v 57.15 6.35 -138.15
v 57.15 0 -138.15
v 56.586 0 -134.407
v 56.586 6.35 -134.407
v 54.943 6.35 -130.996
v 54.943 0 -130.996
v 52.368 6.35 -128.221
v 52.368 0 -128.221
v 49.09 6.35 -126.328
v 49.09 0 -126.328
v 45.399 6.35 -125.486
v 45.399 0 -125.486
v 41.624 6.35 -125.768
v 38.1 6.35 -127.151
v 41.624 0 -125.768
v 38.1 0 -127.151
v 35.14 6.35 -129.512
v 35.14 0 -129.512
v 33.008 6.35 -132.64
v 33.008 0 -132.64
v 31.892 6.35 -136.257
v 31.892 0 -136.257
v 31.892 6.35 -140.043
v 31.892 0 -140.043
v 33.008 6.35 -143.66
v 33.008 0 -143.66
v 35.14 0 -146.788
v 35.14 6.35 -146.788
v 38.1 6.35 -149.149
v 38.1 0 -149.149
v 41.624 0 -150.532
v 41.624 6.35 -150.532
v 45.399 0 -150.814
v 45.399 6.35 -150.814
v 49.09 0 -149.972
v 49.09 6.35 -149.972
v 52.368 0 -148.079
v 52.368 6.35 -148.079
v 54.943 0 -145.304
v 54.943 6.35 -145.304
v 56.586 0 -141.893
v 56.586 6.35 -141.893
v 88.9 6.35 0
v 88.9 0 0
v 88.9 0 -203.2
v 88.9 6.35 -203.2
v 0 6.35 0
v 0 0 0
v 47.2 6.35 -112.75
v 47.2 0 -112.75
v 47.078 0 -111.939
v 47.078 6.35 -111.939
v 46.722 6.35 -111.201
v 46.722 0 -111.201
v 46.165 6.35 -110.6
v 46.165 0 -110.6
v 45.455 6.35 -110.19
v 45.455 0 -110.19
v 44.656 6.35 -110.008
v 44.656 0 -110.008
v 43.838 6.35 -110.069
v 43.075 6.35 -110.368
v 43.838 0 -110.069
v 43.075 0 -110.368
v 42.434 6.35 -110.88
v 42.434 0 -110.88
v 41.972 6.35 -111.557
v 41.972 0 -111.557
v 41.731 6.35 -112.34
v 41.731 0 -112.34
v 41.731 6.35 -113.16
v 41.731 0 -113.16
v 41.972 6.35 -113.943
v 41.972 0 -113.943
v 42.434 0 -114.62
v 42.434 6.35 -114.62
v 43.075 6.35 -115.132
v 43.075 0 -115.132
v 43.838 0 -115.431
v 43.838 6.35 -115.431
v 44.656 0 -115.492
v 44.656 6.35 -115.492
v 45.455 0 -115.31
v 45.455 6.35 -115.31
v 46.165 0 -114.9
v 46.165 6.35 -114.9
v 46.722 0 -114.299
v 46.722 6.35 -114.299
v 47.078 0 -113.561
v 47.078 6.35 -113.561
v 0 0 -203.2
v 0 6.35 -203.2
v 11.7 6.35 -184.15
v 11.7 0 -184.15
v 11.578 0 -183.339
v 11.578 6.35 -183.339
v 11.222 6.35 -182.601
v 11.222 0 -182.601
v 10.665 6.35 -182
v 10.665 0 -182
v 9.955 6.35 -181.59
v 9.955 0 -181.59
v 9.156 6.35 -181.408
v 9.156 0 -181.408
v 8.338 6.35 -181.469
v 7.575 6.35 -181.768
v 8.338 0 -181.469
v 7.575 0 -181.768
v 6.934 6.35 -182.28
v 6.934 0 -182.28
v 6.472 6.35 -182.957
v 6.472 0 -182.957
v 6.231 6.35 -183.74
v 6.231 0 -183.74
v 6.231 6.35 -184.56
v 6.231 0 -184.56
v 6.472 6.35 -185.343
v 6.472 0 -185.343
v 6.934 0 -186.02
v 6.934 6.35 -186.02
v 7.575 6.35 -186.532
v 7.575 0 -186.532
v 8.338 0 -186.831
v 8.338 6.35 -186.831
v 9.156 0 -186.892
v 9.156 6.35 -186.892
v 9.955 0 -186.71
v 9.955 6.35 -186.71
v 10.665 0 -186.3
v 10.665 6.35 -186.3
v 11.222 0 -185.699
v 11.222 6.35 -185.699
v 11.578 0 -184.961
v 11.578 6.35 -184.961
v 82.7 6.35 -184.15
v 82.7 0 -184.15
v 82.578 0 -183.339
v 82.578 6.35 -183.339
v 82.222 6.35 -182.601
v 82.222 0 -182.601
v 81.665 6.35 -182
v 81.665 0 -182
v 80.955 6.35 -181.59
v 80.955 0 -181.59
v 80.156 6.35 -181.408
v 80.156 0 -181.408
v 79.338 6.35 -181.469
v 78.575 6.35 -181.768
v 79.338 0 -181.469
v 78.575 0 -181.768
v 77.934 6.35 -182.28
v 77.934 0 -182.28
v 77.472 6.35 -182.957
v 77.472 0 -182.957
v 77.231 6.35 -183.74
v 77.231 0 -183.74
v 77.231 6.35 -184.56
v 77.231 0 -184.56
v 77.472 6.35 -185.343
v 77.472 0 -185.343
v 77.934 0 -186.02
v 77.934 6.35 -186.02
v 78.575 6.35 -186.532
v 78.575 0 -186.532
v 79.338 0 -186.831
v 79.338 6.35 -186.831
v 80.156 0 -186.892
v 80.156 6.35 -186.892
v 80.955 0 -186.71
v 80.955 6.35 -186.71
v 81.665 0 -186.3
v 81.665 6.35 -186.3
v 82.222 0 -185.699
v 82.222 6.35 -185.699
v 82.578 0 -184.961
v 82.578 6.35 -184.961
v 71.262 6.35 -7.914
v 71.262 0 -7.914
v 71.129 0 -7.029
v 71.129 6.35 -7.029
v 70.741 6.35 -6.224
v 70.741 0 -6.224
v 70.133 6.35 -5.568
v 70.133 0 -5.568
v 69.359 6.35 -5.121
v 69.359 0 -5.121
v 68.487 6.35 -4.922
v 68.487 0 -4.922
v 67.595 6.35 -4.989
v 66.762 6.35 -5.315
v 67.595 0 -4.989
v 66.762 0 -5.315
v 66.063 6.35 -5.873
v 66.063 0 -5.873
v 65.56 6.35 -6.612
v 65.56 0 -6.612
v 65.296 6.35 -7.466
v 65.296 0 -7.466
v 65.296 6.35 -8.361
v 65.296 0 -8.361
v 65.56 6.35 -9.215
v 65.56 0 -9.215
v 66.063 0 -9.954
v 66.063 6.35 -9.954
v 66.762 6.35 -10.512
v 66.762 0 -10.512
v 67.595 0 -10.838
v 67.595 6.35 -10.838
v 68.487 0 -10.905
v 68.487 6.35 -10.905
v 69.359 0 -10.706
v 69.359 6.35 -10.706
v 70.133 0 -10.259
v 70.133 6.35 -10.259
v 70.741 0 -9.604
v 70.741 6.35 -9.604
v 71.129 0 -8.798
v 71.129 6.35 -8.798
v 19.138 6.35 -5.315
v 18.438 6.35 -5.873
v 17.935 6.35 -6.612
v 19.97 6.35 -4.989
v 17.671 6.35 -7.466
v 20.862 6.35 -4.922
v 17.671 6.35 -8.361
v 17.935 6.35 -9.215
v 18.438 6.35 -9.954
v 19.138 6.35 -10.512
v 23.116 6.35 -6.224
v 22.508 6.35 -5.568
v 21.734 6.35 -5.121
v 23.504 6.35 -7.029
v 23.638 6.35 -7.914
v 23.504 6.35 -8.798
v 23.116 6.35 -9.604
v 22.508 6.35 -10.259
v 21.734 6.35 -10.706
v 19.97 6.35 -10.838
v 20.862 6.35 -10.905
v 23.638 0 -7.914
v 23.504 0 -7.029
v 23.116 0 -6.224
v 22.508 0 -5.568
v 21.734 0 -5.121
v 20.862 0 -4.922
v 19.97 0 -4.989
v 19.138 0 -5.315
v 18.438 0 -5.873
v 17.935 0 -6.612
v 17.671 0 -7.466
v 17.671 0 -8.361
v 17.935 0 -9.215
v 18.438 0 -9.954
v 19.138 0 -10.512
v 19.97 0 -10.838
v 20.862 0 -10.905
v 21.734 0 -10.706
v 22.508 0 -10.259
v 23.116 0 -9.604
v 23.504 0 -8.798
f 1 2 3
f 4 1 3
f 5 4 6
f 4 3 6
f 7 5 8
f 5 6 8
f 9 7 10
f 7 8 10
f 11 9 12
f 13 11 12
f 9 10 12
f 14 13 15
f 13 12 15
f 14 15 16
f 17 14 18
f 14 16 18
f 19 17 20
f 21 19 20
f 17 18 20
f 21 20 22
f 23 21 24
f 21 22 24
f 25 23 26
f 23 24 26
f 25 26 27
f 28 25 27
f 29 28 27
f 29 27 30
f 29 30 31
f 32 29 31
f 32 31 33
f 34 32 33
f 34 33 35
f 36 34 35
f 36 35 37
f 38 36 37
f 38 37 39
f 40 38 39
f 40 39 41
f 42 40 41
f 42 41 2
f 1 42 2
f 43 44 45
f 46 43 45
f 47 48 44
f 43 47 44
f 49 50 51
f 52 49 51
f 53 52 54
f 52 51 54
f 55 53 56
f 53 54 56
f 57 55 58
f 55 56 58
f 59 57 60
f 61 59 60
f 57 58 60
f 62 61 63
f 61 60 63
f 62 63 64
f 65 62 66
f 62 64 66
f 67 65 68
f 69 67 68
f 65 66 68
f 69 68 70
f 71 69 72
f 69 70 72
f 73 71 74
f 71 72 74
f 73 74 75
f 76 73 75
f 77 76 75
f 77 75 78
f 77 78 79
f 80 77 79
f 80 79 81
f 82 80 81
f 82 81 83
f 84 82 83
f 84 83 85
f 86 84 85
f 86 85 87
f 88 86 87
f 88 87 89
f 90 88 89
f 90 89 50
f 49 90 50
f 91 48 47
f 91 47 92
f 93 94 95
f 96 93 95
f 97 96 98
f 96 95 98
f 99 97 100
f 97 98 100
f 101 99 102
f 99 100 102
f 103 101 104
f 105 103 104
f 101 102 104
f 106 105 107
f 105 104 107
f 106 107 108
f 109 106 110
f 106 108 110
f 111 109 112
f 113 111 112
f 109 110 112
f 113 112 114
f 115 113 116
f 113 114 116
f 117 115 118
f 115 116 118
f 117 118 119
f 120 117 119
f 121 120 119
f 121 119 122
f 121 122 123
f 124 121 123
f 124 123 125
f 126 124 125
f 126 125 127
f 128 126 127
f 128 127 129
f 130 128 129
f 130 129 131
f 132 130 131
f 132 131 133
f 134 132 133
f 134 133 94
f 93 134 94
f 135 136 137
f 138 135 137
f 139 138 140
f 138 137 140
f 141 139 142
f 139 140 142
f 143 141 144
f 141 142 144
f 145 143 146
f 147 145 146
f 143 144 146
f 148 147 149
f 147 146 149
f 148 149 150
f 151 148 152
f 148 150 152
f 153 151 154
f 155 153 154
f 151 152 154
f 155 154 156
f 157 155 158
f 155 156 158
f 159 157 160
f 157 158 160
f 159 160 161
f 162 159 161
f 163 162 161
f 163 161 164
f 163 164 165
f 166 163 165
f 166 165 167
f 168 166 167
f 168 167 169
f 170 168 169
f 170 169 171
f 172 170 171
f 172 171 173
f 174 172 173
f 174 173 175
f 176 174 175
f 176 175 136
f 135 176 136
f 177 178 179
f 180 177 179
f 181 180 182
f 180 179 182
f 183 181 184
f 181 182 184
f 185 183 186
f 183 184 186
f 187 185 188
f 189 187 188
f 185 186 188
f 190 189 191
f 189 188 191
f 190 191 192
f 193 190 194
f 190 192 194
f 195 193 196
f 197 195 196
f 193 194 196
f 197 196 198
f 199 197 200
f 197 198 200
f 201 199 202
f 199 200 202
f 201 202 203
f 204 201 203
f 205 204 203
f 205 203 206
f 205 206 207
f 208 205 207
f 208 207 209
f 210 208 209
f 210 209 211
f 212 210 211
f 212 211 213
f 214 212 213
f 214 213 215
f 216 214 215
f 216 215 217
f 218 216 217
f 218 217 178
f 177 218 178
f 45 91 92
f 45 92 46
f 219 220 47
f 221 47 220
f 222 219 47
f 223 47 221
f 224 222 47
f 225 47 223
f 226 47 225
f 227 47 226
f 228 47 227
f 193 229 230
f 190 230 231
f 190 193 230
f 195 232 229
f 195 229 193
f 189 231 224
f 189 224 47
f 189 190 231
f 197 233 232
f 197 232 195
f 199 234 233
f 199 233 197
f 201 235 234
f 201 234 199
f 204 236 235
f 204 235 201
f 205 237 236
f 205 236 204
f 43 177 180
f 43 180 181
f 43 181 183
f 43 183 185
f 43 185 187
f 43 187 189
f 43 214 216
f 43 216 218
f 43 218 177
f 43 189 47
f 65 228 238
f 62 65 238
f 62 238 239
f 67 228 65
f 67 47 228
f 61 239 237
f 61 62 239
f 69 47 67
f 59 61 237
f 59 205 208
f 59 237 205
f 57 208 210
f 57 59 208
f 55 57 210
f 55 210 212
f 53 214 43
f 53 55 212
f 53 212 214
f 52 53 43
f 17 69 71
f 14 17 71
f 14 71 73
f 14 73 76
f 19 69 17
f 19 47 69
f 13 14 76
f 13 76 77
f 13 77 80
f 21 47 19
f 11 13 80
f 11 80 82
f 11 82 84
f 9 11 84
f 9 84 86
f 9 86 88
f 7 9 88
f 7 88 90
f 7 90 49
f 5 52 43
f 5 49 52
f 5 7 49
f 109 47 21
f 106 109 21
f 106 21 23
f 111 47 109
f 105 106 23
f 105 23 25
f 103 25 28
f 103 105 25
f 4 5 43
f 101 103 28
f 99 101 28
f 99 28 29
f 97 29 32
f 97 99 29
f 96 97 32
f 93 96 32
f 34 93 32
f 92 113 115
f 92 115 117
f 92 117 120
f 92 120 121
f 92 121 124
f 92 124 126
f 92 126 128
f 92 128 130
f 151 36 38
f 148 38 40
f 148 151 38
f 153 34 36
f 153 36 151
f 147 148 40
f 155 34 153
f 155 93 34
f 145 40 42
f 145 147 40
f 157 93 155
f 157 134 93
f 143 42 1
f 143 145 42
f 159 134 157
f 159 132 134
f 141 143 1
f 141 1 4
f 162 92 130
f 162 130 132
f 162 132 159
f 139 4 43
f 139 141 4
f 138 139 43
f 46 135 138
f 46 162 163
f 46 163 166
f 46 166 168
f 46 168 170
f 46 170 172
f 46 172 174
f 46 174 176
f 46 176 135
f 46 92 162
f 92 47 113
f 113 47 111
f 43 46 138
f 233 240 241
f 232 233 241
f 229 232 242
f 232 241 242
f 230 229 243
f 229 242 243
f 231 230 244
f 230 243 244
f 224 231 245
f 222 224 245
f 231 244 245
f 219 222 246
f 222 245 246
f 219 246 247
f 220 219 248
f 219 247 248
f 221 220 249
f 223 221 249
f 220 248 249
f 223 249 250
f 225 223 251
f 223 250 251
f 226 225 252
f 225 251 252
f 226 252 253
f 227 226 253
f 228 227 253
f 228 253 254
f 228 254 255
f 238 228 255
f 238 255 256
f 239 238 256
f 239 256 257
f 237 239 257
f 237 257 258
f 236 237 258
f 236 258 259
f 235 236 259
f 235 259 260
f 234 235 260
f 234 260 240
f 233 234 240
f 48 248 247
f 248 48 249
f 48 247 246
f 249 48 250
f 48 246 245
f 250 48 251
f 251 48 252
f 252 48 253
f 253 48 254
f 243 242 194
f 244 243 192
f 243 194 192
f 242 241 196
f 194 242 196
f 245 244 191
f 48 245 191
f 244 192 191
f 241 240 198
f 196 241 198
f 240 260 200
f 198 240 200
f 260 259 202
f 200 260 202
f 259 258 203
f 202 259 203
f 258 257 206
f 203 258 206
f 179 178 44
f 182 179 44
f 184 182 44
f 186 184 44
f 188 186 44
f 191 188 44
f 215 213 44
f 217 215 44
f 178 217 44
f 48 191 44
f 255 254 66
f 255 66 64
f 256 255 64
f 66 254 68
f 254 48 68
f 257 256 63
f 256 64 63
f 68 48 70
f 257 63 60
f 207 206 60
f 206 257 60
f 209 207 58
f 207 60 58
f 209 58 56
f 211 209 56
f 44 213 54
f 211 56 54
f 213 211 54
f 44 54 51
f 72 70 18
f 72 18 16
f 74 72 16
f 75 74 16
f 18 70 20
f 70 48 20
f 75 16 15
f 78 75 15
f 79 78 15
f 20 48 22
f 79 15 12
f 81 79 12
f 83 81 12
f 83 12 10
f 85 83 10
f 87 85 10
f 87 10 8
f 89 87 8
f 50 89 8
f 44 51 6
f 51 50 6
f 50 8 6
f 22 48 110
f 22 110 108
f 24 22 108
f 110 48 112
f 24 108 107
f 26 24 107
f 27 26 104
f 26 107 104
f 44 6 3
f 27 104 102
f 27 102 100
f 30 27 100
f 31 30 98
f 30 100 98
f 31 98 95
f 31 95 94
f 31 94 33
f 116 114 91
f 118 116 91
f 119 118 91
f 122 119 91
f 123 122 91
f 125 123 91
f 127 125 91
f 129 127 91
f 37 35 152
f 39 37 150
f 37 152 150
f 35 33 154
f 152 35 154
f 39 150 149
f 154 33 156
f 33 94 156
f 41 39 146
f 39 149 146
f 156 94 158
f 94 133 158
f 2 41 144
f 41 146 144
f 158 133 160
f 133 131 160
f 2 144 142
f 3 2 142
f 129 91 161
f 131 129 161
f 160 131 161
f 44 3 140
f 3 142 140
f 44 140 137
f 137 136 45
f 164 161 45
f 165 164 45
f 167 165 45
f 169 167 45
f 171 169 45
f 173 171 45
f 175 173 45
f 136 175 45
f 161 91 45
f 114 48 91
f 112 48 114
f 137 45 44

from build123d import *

# Parameters (mm, degrees)
SKETCH1_W           = 88.9
SKETCH1_H           = 203.2
BOSS_EXTRUDE1_DEPTH = 6.35
SKETCH2_R           = 3
SKETCH2_R_2         = 2.75
SKETCH2_R_3         = 12.7
CUT_EXTRUDE1_DEPTH  = 7.35


with BuildPart() as part:
    # Sketch1 → Boss-Extrude1 (new body)
    with BuildSketch(Plane(origin=(0, 0, 0), x_dir=(1, 0, 0), z_dir=(0, 1, 0))):
        with Locations((44.45, 101.6)):
            Rectangle(SKETCH1_W, SKETCH1_H)
    extrude(amount=BOSS_EXTRUDE1_DEPTH)

    # Sketch2 → Cut-Extrude1 (cut, through all)
    with BuildSketch(Plane.XZ):
        with Locations((20.6375, -7.913544442)):
            Circle(SKETCH2_R)
        with Locations((68.2625, -7.913544442)):
            Circle(SKETCH2_R)
        with Locations((44.45, -112.75)):
            Circle(SKETCH2_R_2)
        with Locations((8.95, -184.15)):
            Circle(SKETCH2_R_2)
        with Locations((79.95, -184.15)):
            Circle(SKETCH2_R_2)
        with Locations((44.45, -138.15)):
            Circle(SKETCH2_R_3)
    extrude(amount=-CUT_EXTRUDE1_DEPTH, mode=Mode.SUBTRACT)


solid = part.part
